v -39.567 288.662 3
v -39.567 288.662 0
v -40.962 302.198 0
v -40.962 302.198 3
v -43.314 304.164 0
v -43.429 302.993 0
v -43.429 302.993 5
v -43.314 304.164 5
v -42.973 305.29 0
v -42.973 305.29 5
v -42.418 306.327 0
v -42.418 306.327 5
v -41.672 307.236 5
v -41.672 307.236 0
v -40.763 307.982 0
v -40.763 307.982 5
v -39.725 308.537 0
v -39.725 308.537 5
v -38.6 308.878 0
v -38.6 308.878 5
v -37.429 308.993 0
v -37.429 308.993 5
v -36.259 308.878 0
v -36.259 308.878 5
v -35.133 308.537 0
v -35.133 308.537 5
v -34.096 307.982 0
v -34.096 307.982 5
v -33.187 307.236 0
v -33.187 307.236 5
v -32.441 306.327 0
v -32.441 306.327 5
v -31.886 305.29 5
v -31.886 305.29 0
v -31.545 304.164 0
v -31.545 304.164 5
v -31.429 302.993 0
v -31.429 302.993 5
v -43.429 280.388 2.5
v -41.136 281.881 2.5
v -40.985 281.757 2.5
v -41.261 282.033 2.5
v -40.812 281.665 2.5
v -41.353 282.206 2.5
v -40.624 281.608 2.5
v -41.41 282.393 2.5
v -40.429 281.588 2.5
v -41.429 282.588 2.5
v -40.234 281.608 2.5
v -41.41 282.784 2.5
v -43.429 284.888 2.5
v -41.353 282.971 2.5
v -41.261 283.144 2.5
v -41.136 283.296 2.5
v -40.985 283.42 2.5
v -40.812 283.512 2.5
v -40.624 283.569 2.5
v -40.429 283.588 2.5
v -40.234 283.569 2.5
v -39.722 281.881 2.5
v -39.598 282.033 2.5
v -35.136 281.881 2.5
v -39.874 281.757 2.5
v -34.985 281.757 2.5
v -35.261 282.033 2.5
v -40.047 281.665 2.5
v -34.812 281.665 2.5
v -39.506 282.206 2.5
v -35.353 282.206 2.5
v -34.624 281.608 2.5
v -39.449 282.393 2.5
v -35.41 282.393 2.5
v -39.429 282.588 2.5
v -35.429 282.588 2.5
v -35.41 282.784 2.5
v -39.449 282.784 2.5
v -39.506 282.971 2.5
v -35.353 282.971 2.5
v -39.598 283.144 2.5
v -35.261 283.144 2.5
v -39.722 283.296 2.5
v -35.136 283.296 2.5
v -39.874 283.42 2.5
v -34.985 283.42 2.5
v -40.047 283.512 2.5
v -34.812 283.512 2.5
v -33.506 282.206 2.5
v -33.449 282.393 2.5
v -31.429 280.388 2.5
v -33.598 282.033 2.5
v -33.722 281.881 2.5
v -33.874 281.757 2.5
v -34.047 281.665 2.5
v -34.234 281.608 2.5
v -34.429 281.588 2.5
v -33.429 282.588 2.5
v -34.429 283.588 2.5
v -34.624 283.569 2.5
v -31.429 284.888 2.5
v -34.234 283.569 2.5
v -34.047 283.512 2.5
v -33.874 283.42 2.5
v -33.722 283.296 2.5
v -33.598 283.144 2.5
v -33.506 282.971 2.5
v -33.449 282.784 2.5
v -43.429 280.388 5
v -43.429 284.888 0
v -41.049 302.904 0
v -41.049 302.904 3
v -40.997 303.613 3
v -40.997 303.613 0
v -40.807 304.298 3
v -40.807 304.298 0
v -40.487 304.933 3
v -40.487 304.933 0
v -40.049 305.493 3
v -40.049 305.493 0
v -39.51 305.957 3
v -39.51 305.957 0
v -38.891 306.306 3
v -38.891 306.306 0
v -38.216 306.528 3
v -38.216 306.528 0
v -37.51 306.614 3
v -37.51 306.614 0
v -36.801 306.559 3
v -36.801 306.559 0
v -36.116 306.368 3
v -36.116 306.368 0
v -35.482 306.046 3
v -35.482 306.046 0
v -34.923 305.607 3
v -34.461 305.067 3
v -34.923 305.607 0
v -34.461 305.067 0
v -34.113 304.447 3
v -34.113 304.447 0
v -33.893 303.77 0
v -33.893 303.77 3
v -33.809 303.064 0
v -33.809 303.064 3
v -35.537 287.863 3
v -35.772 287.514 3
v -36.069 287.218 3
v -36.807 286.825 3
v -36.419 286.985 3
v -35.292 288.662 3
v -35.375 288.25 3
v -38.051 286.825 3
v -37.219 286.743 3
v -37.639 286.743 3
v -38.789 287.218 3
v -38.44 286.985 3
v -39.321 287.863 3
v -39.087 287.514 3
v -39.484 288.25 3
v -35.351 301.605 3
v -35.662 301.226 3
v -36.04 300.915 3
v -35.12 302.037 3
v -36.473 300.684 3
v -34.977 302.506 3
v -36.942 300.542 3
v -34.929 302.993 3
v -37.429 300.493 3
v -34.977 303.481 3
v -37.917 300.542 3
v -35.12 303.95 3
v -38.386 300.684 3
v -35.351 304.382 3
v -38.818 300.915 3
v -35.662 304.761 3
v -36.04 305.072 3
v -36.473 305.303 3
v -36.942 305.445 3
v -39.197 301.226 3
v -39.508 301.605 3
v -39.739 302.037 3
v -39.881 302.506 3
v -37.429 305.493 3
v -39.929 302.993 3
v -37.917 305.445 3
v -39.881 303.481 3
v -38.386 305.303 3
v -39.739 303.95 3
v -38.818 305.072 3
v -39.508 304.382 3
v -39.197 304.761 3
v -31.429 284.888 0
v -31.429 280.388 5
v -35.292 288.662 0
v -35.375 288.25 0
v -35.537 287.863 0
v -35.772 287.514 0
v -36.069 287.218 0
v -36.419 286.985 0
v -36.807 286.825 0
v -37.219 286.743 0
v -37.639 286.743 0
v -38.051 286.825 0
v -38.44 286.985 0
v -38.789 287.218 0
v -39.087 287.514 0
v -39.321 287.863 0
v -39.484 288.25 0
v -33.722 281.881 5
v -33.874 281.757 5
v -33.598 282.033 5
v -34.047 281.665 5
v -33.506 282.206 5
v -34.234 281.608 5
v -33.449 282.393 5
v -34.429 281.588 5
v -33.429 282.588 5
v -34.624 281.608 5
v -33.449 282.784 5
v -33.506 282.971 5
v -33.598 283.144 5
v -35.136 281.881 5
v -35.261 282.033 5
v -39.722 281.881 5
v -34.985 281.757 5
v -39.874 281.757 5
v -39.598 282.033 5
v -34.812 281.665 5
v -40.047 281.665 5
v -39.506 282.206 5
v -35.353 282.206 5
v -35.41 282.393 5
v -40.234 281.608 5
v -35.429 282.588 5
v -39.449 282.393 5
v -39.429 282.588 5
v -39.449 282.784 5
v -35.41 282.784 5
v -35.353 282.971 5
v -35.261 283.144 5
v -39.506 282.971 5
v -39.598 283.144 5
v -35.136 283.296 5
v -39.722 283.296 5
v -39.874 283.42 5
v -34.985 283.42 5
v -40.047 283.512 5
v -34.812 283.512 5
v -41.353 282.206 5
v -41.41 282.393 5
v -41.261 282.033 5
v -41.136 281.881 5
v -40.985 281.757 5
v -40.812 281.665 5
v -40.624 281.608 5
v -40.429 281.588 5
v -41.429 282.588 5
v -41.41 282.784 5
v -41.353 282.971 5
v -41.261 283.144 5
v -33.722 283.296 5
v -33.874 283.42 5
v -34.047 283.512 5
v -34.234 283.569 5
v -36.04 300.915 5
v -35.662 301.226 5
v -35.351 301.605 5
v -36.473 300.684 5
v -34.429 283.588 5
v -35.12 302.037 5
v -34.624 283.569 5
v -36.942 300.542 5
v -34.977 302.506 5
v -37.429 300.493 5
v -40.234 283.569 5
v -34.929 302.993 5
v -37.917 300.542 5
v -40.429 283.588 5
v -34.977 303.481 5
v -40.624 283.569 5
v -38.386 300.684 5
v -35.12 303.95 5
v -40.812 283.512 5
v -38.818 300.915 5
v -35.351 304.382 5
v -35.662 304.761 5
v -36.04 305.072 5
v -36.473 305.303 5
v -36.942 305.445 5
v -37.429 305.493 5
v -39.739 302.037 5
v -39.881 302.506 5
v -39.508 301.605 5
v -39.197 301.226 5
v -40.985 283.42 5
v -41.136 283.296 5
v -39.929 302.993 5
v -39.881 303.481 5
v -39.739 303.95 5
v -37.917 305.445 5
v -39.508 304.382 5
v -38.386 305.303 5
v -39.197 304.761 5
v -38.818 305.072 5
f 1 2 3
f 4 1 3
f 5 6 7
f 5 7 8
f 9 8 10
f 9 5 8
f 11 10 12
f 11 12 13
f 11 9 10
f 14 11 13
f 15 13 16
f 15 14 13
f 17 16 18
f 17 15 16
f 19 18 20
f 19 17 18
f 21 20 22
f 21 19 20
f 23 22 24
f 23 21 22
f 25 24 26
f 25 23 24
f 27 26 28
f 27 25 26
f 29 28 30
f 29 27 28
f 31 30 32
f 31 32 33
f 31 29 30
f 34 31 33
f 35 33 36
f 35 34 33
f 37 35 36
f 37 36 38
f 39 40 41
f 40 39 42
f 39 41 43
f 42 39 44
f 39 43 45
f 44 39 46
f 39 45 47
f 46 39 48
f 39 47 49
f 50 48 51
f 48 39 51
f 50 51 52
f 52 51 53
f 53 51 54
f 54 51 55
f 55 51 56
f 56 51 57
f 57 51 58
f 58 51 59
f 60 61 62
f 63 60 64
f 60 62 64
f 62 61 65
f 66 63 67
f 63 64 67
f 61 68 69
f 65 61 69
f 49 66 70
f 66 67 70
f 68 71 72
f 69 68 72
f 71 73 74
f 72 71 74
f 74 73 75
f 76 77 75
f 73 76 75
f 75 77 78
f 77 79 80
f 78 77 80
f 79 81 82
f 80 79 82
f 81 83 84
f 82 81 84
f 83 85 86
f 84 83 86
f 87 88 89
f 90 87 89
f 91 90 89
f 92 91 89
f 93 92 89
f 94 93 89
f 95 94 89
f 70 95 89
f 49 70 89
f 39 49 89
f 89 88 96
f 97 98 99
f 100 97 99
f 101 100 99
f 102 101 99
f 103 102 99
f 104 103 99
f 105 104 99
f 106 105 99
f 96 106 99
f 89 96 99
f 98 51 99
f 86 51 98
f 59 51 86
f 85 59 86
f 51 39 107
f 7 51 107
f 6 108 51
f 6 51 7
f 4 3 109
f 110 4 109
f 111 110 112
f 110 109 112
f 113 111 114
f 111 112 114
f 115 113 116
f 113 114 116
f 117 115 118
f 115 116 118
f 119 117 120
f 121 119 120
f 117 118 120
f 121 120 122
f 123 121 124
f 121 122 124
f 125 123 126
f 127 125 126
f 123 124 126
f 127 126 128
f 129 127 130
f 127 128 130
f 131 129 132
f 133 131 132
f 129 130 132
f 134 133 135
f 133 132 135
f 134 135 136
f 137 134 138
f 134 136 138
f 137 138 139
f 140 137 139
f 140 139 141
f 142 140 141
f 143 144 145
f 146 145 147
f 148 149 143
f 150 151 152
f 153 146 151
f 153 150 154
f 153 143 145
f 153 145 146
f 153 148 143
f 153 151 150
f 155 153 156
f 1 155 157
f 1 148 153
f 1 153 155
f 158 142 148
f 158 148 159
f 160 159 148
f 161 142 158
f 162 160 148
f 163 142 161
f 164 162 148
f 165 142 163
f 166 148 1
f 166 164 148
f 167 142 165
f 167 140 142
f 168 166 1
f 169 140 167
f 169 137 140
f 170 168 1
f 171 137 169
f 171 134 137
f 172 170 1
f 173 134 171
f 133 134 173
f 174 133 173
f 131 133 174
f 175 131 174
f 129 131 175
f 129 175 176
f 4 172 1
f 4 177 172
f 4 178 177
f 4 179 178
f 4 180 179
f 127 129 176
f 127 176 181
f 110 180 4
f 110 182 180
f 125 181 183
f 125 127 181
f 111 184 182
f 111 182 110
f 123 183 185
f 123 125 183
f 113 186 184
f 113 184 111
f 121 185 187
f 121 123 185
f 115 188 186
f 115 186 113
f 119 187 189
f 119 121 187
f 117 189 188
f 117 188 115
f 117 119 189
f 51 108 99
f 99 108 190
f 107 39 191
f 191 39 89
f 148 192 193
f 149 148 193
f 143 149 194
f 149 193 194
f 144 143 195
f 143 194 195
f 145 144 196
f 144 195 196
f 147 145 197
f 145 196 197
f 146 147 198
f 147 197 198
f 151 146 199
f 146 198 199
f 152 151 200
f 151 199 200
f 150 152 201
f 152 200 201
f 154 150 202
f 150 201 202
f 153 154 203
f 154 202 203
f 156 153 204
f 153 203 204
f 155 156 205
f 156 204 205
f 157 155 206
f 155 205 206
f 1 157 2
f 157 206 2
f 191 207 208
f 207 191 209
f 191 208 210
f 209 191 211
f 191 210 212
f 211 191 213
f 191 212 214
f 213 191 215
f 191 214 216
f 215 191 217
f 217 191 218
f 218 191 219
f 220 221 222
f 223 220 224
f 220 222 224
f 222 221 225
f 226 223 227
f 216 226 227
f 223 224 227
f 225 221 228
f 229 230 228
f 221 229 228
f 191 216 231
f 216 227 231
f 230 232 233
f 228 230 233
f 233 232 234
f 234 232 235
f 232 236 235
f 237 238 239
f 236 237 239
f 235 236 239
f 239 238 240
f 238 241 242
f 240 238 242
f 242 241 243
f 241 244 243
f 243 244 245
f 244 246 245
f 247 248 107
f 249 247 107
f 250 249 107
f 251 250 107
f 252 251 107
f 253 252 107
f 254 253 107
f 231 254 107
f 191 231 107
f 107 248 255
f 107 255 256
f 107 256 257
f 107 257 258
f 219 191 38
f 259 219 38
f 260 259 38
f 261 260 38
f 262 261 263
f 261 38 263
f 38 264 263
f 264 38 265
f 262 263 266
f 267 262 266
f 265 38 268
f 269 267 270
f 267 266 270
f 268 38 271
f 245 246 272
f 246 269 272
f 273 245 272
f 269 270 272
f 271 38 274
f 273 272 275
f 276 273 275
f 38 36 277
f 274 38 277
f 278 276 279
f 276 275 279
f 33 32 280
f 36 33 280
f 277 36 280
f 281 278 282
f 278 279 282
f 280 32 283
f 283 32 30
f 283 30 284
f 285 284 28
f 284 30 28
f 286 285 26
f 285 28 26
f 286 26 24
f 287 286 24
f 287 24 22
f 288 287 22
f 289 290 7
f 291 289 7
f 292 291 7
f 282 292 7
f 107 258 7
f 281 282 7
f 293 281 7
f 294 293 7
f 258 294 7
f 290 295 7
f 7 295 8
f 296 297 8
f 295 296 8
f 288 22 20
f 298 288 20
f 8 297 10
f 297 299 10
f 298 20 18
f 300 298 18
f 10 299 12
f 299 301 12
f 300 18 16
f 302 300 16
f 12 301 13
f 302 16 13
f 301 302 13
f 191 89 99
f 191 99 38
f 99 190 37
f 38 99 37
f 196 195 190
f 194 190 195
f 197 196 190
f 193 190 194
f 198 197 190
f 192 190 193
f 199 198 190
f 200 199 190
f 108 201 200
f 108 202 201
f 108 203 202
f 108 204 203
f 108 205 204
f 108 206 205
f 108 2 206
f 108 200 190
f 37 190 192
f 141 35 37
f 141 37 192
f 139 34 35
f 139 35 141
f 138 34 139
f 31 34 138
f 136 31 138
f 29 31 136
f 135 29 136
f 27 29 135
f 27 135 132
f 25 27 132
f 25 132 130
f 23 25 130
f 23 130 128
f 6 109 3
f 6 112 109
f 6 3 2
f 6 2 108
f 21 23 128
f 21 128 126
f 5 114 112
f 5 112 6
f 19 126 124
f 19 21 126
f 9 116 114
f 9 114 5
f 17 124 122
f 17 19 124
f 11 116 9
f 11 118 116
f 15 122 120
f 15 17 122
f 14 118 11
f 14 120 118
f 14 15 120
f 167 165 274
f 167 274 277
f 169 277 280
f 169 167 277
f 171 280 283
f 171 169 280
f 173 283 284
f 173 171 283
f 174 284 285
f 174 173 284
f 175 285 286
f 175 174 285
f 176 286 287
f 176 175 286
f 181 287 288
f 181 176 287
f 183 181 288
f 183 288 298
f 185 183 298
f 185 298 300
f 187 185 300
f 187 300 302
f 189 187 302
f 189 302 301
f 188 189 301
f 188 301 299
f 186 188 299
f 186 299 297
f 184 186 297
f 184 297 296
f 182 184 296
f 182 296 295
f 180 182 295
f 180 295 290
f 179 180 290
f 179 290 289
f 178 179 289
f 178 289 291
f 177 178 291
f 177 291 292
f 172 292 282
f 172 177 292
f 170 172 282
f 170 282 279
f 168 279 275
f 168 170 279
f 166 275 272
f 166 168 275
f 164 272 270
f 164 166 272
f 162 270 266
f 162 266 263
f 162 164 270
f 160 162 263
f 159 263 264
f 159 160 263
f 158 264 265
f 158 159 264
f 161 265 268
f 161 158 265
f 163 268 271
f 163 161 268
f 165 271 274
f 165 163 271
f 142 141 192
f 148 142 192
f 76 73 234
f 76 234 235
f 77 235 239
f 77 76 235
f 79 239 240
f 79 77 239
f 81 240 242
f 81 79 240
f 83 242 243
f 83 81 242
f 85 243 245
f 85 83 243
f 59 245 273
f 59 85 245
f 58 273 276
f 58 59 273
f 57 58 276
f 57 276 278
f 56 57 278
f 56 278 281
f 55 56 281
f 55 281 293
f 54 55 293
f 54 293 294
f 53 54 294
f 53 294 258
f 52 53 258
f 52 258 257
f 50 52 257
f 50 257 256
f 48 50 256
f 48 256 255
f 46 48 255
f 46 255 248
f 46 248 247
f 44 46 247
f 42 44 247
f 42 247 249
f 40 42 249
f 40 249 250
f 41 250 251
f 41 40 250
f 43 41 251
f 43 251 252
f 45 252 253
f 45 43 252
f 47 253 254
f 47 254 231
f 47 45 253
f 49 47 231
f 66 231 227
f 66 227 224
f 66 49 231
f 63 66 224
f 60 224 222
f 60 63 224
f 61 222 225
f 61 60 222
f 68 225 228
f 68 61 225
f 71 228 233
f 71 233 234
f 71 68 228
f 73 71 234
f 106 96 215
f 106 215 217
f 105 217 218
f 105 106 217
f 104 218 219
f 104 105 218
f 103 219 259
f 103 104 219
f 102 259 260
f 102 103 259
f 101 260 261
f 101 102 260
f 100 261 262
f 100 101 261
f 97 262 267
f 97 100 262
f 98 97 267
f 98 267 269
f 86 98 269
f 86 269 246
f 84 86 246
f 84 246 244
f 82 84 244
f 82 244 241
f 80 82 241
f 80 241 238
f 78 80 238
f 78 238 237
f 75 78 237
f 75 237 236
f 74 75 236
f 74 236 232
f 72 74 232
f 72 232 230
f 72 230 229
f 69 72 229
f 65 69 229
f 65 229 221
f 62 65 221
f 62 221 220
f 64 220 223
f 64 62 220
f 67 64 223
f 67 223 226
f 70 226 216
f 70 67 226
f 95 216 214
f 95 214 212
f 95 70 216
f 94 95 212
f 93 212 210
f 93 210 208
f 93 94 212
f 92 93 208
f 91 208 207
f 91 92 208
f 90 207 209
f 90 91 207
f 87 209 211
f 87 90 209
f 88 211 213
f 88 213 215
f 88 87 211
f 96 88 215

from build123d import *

# Parameters (mm, degrees)
SKETCH1_W           = 11.999998241
SKETCH1_H           = 22.605046118
BOSS_EXTRUDE1_DEPTH = 5
BOSS_EXTRUDE2_DEPTH = 5
SKETCH4_R           = 2.5
CUT_EXTRUDE3_DEPTH  = 5
CUT_EXTRUDE7_DEPTH  = 3
SKETCH10_W          = 11.999998241
SKETCH10_H          = 4.5
CUT_EXTRUDE8_DEPTH  = 2.5
SKETCH12_R          = 1
CUT_EXTRUDE9_DEPTH  = 5


with BuildPart() as part:
    # Sketch1 → Boss-Extrude1 (new body)
    with BuildSketch(Plane.XY):
        with Locations((-37.429383025, 291.690953332)):
            Rectangle(SKETCH1_W, SKETCH1_H)
    extrude(amount=BOSS_EXTRUDE1_DEPTH)

    # Sketch3 → Boss-Extrude2 (add)
    with BuildSketch(Plane.XY):
        with BuildLine():
            Line((-31.429383904, 302.993476391), (-43.429382145, 302.993476391))
            ThreePointArc((-43.429382145, 302.993476391), (-37.429383025, 308.993475512), (-31.429383904, 302.993476391))
        make_face()
    extrude(amount=BOSS_EXTRUDE2_DEPTH)

    # Sketch4 → Cut-Extrude3 (cut)
    with BuildSketch(Plane.XY):
        with Locations((-37.429383025, 302.993476391)):
            Circle(SKETCH4_R)
    extrude(amount=CUT_EXTRUDE3_DEPTH, mode=Mode.SUBTRACT)

    # Sketch6 → Cut-Extrude7 (cut)
    with BuildSketch(Plane.XY):
        with BuildLine():
            Line((-33.809082583, 303.064405918), (-35.29156372, 288.661777973))
            ThreePointArc((-35.29156372, 288.661777973), (-37.429381162, 286.732713757), (-39.567198604, 288.661777973))
            Line((-39.567198604, 288.661777973), (-40.961969567, 302.198216304))
            ThreePointArc((-40.961969567, 302.198216304), (-37.864692735, 306.588210281), (-33.809082583, 303.064405918))
        make_face()
    extrude(amount=CUT_EXTRUDE7_DEPTH, mode=Mode.SUBTRACT)

    # Sketch10 → Cut-Extrude8 (cut)
    with BuildSketch(Plane.XY):
        with Locations((-37.429383025, 282.638430273)):
            Rectangle(SKETCH10_W, SKETCH10_H)
    extrude(amount=CUT_EXTRUDE8_DEPTH, mode=Mode.SUBTRACT)

    # Sketch12 → Cut-Extrude9 (cut)
    with BuildSketch(Plane.XY):
        with Locations((-34.429383904, 282.588430273)):
            Circle(SKETCH12_R)
        with Locations((-40.429382145, 282.588430273)):
            Circle(SKETCH12_R)
    extrude(amount=CUT_EXTRUDE9_DEPTH, mode=Mode.SUBTRACT)


solid = part.part
